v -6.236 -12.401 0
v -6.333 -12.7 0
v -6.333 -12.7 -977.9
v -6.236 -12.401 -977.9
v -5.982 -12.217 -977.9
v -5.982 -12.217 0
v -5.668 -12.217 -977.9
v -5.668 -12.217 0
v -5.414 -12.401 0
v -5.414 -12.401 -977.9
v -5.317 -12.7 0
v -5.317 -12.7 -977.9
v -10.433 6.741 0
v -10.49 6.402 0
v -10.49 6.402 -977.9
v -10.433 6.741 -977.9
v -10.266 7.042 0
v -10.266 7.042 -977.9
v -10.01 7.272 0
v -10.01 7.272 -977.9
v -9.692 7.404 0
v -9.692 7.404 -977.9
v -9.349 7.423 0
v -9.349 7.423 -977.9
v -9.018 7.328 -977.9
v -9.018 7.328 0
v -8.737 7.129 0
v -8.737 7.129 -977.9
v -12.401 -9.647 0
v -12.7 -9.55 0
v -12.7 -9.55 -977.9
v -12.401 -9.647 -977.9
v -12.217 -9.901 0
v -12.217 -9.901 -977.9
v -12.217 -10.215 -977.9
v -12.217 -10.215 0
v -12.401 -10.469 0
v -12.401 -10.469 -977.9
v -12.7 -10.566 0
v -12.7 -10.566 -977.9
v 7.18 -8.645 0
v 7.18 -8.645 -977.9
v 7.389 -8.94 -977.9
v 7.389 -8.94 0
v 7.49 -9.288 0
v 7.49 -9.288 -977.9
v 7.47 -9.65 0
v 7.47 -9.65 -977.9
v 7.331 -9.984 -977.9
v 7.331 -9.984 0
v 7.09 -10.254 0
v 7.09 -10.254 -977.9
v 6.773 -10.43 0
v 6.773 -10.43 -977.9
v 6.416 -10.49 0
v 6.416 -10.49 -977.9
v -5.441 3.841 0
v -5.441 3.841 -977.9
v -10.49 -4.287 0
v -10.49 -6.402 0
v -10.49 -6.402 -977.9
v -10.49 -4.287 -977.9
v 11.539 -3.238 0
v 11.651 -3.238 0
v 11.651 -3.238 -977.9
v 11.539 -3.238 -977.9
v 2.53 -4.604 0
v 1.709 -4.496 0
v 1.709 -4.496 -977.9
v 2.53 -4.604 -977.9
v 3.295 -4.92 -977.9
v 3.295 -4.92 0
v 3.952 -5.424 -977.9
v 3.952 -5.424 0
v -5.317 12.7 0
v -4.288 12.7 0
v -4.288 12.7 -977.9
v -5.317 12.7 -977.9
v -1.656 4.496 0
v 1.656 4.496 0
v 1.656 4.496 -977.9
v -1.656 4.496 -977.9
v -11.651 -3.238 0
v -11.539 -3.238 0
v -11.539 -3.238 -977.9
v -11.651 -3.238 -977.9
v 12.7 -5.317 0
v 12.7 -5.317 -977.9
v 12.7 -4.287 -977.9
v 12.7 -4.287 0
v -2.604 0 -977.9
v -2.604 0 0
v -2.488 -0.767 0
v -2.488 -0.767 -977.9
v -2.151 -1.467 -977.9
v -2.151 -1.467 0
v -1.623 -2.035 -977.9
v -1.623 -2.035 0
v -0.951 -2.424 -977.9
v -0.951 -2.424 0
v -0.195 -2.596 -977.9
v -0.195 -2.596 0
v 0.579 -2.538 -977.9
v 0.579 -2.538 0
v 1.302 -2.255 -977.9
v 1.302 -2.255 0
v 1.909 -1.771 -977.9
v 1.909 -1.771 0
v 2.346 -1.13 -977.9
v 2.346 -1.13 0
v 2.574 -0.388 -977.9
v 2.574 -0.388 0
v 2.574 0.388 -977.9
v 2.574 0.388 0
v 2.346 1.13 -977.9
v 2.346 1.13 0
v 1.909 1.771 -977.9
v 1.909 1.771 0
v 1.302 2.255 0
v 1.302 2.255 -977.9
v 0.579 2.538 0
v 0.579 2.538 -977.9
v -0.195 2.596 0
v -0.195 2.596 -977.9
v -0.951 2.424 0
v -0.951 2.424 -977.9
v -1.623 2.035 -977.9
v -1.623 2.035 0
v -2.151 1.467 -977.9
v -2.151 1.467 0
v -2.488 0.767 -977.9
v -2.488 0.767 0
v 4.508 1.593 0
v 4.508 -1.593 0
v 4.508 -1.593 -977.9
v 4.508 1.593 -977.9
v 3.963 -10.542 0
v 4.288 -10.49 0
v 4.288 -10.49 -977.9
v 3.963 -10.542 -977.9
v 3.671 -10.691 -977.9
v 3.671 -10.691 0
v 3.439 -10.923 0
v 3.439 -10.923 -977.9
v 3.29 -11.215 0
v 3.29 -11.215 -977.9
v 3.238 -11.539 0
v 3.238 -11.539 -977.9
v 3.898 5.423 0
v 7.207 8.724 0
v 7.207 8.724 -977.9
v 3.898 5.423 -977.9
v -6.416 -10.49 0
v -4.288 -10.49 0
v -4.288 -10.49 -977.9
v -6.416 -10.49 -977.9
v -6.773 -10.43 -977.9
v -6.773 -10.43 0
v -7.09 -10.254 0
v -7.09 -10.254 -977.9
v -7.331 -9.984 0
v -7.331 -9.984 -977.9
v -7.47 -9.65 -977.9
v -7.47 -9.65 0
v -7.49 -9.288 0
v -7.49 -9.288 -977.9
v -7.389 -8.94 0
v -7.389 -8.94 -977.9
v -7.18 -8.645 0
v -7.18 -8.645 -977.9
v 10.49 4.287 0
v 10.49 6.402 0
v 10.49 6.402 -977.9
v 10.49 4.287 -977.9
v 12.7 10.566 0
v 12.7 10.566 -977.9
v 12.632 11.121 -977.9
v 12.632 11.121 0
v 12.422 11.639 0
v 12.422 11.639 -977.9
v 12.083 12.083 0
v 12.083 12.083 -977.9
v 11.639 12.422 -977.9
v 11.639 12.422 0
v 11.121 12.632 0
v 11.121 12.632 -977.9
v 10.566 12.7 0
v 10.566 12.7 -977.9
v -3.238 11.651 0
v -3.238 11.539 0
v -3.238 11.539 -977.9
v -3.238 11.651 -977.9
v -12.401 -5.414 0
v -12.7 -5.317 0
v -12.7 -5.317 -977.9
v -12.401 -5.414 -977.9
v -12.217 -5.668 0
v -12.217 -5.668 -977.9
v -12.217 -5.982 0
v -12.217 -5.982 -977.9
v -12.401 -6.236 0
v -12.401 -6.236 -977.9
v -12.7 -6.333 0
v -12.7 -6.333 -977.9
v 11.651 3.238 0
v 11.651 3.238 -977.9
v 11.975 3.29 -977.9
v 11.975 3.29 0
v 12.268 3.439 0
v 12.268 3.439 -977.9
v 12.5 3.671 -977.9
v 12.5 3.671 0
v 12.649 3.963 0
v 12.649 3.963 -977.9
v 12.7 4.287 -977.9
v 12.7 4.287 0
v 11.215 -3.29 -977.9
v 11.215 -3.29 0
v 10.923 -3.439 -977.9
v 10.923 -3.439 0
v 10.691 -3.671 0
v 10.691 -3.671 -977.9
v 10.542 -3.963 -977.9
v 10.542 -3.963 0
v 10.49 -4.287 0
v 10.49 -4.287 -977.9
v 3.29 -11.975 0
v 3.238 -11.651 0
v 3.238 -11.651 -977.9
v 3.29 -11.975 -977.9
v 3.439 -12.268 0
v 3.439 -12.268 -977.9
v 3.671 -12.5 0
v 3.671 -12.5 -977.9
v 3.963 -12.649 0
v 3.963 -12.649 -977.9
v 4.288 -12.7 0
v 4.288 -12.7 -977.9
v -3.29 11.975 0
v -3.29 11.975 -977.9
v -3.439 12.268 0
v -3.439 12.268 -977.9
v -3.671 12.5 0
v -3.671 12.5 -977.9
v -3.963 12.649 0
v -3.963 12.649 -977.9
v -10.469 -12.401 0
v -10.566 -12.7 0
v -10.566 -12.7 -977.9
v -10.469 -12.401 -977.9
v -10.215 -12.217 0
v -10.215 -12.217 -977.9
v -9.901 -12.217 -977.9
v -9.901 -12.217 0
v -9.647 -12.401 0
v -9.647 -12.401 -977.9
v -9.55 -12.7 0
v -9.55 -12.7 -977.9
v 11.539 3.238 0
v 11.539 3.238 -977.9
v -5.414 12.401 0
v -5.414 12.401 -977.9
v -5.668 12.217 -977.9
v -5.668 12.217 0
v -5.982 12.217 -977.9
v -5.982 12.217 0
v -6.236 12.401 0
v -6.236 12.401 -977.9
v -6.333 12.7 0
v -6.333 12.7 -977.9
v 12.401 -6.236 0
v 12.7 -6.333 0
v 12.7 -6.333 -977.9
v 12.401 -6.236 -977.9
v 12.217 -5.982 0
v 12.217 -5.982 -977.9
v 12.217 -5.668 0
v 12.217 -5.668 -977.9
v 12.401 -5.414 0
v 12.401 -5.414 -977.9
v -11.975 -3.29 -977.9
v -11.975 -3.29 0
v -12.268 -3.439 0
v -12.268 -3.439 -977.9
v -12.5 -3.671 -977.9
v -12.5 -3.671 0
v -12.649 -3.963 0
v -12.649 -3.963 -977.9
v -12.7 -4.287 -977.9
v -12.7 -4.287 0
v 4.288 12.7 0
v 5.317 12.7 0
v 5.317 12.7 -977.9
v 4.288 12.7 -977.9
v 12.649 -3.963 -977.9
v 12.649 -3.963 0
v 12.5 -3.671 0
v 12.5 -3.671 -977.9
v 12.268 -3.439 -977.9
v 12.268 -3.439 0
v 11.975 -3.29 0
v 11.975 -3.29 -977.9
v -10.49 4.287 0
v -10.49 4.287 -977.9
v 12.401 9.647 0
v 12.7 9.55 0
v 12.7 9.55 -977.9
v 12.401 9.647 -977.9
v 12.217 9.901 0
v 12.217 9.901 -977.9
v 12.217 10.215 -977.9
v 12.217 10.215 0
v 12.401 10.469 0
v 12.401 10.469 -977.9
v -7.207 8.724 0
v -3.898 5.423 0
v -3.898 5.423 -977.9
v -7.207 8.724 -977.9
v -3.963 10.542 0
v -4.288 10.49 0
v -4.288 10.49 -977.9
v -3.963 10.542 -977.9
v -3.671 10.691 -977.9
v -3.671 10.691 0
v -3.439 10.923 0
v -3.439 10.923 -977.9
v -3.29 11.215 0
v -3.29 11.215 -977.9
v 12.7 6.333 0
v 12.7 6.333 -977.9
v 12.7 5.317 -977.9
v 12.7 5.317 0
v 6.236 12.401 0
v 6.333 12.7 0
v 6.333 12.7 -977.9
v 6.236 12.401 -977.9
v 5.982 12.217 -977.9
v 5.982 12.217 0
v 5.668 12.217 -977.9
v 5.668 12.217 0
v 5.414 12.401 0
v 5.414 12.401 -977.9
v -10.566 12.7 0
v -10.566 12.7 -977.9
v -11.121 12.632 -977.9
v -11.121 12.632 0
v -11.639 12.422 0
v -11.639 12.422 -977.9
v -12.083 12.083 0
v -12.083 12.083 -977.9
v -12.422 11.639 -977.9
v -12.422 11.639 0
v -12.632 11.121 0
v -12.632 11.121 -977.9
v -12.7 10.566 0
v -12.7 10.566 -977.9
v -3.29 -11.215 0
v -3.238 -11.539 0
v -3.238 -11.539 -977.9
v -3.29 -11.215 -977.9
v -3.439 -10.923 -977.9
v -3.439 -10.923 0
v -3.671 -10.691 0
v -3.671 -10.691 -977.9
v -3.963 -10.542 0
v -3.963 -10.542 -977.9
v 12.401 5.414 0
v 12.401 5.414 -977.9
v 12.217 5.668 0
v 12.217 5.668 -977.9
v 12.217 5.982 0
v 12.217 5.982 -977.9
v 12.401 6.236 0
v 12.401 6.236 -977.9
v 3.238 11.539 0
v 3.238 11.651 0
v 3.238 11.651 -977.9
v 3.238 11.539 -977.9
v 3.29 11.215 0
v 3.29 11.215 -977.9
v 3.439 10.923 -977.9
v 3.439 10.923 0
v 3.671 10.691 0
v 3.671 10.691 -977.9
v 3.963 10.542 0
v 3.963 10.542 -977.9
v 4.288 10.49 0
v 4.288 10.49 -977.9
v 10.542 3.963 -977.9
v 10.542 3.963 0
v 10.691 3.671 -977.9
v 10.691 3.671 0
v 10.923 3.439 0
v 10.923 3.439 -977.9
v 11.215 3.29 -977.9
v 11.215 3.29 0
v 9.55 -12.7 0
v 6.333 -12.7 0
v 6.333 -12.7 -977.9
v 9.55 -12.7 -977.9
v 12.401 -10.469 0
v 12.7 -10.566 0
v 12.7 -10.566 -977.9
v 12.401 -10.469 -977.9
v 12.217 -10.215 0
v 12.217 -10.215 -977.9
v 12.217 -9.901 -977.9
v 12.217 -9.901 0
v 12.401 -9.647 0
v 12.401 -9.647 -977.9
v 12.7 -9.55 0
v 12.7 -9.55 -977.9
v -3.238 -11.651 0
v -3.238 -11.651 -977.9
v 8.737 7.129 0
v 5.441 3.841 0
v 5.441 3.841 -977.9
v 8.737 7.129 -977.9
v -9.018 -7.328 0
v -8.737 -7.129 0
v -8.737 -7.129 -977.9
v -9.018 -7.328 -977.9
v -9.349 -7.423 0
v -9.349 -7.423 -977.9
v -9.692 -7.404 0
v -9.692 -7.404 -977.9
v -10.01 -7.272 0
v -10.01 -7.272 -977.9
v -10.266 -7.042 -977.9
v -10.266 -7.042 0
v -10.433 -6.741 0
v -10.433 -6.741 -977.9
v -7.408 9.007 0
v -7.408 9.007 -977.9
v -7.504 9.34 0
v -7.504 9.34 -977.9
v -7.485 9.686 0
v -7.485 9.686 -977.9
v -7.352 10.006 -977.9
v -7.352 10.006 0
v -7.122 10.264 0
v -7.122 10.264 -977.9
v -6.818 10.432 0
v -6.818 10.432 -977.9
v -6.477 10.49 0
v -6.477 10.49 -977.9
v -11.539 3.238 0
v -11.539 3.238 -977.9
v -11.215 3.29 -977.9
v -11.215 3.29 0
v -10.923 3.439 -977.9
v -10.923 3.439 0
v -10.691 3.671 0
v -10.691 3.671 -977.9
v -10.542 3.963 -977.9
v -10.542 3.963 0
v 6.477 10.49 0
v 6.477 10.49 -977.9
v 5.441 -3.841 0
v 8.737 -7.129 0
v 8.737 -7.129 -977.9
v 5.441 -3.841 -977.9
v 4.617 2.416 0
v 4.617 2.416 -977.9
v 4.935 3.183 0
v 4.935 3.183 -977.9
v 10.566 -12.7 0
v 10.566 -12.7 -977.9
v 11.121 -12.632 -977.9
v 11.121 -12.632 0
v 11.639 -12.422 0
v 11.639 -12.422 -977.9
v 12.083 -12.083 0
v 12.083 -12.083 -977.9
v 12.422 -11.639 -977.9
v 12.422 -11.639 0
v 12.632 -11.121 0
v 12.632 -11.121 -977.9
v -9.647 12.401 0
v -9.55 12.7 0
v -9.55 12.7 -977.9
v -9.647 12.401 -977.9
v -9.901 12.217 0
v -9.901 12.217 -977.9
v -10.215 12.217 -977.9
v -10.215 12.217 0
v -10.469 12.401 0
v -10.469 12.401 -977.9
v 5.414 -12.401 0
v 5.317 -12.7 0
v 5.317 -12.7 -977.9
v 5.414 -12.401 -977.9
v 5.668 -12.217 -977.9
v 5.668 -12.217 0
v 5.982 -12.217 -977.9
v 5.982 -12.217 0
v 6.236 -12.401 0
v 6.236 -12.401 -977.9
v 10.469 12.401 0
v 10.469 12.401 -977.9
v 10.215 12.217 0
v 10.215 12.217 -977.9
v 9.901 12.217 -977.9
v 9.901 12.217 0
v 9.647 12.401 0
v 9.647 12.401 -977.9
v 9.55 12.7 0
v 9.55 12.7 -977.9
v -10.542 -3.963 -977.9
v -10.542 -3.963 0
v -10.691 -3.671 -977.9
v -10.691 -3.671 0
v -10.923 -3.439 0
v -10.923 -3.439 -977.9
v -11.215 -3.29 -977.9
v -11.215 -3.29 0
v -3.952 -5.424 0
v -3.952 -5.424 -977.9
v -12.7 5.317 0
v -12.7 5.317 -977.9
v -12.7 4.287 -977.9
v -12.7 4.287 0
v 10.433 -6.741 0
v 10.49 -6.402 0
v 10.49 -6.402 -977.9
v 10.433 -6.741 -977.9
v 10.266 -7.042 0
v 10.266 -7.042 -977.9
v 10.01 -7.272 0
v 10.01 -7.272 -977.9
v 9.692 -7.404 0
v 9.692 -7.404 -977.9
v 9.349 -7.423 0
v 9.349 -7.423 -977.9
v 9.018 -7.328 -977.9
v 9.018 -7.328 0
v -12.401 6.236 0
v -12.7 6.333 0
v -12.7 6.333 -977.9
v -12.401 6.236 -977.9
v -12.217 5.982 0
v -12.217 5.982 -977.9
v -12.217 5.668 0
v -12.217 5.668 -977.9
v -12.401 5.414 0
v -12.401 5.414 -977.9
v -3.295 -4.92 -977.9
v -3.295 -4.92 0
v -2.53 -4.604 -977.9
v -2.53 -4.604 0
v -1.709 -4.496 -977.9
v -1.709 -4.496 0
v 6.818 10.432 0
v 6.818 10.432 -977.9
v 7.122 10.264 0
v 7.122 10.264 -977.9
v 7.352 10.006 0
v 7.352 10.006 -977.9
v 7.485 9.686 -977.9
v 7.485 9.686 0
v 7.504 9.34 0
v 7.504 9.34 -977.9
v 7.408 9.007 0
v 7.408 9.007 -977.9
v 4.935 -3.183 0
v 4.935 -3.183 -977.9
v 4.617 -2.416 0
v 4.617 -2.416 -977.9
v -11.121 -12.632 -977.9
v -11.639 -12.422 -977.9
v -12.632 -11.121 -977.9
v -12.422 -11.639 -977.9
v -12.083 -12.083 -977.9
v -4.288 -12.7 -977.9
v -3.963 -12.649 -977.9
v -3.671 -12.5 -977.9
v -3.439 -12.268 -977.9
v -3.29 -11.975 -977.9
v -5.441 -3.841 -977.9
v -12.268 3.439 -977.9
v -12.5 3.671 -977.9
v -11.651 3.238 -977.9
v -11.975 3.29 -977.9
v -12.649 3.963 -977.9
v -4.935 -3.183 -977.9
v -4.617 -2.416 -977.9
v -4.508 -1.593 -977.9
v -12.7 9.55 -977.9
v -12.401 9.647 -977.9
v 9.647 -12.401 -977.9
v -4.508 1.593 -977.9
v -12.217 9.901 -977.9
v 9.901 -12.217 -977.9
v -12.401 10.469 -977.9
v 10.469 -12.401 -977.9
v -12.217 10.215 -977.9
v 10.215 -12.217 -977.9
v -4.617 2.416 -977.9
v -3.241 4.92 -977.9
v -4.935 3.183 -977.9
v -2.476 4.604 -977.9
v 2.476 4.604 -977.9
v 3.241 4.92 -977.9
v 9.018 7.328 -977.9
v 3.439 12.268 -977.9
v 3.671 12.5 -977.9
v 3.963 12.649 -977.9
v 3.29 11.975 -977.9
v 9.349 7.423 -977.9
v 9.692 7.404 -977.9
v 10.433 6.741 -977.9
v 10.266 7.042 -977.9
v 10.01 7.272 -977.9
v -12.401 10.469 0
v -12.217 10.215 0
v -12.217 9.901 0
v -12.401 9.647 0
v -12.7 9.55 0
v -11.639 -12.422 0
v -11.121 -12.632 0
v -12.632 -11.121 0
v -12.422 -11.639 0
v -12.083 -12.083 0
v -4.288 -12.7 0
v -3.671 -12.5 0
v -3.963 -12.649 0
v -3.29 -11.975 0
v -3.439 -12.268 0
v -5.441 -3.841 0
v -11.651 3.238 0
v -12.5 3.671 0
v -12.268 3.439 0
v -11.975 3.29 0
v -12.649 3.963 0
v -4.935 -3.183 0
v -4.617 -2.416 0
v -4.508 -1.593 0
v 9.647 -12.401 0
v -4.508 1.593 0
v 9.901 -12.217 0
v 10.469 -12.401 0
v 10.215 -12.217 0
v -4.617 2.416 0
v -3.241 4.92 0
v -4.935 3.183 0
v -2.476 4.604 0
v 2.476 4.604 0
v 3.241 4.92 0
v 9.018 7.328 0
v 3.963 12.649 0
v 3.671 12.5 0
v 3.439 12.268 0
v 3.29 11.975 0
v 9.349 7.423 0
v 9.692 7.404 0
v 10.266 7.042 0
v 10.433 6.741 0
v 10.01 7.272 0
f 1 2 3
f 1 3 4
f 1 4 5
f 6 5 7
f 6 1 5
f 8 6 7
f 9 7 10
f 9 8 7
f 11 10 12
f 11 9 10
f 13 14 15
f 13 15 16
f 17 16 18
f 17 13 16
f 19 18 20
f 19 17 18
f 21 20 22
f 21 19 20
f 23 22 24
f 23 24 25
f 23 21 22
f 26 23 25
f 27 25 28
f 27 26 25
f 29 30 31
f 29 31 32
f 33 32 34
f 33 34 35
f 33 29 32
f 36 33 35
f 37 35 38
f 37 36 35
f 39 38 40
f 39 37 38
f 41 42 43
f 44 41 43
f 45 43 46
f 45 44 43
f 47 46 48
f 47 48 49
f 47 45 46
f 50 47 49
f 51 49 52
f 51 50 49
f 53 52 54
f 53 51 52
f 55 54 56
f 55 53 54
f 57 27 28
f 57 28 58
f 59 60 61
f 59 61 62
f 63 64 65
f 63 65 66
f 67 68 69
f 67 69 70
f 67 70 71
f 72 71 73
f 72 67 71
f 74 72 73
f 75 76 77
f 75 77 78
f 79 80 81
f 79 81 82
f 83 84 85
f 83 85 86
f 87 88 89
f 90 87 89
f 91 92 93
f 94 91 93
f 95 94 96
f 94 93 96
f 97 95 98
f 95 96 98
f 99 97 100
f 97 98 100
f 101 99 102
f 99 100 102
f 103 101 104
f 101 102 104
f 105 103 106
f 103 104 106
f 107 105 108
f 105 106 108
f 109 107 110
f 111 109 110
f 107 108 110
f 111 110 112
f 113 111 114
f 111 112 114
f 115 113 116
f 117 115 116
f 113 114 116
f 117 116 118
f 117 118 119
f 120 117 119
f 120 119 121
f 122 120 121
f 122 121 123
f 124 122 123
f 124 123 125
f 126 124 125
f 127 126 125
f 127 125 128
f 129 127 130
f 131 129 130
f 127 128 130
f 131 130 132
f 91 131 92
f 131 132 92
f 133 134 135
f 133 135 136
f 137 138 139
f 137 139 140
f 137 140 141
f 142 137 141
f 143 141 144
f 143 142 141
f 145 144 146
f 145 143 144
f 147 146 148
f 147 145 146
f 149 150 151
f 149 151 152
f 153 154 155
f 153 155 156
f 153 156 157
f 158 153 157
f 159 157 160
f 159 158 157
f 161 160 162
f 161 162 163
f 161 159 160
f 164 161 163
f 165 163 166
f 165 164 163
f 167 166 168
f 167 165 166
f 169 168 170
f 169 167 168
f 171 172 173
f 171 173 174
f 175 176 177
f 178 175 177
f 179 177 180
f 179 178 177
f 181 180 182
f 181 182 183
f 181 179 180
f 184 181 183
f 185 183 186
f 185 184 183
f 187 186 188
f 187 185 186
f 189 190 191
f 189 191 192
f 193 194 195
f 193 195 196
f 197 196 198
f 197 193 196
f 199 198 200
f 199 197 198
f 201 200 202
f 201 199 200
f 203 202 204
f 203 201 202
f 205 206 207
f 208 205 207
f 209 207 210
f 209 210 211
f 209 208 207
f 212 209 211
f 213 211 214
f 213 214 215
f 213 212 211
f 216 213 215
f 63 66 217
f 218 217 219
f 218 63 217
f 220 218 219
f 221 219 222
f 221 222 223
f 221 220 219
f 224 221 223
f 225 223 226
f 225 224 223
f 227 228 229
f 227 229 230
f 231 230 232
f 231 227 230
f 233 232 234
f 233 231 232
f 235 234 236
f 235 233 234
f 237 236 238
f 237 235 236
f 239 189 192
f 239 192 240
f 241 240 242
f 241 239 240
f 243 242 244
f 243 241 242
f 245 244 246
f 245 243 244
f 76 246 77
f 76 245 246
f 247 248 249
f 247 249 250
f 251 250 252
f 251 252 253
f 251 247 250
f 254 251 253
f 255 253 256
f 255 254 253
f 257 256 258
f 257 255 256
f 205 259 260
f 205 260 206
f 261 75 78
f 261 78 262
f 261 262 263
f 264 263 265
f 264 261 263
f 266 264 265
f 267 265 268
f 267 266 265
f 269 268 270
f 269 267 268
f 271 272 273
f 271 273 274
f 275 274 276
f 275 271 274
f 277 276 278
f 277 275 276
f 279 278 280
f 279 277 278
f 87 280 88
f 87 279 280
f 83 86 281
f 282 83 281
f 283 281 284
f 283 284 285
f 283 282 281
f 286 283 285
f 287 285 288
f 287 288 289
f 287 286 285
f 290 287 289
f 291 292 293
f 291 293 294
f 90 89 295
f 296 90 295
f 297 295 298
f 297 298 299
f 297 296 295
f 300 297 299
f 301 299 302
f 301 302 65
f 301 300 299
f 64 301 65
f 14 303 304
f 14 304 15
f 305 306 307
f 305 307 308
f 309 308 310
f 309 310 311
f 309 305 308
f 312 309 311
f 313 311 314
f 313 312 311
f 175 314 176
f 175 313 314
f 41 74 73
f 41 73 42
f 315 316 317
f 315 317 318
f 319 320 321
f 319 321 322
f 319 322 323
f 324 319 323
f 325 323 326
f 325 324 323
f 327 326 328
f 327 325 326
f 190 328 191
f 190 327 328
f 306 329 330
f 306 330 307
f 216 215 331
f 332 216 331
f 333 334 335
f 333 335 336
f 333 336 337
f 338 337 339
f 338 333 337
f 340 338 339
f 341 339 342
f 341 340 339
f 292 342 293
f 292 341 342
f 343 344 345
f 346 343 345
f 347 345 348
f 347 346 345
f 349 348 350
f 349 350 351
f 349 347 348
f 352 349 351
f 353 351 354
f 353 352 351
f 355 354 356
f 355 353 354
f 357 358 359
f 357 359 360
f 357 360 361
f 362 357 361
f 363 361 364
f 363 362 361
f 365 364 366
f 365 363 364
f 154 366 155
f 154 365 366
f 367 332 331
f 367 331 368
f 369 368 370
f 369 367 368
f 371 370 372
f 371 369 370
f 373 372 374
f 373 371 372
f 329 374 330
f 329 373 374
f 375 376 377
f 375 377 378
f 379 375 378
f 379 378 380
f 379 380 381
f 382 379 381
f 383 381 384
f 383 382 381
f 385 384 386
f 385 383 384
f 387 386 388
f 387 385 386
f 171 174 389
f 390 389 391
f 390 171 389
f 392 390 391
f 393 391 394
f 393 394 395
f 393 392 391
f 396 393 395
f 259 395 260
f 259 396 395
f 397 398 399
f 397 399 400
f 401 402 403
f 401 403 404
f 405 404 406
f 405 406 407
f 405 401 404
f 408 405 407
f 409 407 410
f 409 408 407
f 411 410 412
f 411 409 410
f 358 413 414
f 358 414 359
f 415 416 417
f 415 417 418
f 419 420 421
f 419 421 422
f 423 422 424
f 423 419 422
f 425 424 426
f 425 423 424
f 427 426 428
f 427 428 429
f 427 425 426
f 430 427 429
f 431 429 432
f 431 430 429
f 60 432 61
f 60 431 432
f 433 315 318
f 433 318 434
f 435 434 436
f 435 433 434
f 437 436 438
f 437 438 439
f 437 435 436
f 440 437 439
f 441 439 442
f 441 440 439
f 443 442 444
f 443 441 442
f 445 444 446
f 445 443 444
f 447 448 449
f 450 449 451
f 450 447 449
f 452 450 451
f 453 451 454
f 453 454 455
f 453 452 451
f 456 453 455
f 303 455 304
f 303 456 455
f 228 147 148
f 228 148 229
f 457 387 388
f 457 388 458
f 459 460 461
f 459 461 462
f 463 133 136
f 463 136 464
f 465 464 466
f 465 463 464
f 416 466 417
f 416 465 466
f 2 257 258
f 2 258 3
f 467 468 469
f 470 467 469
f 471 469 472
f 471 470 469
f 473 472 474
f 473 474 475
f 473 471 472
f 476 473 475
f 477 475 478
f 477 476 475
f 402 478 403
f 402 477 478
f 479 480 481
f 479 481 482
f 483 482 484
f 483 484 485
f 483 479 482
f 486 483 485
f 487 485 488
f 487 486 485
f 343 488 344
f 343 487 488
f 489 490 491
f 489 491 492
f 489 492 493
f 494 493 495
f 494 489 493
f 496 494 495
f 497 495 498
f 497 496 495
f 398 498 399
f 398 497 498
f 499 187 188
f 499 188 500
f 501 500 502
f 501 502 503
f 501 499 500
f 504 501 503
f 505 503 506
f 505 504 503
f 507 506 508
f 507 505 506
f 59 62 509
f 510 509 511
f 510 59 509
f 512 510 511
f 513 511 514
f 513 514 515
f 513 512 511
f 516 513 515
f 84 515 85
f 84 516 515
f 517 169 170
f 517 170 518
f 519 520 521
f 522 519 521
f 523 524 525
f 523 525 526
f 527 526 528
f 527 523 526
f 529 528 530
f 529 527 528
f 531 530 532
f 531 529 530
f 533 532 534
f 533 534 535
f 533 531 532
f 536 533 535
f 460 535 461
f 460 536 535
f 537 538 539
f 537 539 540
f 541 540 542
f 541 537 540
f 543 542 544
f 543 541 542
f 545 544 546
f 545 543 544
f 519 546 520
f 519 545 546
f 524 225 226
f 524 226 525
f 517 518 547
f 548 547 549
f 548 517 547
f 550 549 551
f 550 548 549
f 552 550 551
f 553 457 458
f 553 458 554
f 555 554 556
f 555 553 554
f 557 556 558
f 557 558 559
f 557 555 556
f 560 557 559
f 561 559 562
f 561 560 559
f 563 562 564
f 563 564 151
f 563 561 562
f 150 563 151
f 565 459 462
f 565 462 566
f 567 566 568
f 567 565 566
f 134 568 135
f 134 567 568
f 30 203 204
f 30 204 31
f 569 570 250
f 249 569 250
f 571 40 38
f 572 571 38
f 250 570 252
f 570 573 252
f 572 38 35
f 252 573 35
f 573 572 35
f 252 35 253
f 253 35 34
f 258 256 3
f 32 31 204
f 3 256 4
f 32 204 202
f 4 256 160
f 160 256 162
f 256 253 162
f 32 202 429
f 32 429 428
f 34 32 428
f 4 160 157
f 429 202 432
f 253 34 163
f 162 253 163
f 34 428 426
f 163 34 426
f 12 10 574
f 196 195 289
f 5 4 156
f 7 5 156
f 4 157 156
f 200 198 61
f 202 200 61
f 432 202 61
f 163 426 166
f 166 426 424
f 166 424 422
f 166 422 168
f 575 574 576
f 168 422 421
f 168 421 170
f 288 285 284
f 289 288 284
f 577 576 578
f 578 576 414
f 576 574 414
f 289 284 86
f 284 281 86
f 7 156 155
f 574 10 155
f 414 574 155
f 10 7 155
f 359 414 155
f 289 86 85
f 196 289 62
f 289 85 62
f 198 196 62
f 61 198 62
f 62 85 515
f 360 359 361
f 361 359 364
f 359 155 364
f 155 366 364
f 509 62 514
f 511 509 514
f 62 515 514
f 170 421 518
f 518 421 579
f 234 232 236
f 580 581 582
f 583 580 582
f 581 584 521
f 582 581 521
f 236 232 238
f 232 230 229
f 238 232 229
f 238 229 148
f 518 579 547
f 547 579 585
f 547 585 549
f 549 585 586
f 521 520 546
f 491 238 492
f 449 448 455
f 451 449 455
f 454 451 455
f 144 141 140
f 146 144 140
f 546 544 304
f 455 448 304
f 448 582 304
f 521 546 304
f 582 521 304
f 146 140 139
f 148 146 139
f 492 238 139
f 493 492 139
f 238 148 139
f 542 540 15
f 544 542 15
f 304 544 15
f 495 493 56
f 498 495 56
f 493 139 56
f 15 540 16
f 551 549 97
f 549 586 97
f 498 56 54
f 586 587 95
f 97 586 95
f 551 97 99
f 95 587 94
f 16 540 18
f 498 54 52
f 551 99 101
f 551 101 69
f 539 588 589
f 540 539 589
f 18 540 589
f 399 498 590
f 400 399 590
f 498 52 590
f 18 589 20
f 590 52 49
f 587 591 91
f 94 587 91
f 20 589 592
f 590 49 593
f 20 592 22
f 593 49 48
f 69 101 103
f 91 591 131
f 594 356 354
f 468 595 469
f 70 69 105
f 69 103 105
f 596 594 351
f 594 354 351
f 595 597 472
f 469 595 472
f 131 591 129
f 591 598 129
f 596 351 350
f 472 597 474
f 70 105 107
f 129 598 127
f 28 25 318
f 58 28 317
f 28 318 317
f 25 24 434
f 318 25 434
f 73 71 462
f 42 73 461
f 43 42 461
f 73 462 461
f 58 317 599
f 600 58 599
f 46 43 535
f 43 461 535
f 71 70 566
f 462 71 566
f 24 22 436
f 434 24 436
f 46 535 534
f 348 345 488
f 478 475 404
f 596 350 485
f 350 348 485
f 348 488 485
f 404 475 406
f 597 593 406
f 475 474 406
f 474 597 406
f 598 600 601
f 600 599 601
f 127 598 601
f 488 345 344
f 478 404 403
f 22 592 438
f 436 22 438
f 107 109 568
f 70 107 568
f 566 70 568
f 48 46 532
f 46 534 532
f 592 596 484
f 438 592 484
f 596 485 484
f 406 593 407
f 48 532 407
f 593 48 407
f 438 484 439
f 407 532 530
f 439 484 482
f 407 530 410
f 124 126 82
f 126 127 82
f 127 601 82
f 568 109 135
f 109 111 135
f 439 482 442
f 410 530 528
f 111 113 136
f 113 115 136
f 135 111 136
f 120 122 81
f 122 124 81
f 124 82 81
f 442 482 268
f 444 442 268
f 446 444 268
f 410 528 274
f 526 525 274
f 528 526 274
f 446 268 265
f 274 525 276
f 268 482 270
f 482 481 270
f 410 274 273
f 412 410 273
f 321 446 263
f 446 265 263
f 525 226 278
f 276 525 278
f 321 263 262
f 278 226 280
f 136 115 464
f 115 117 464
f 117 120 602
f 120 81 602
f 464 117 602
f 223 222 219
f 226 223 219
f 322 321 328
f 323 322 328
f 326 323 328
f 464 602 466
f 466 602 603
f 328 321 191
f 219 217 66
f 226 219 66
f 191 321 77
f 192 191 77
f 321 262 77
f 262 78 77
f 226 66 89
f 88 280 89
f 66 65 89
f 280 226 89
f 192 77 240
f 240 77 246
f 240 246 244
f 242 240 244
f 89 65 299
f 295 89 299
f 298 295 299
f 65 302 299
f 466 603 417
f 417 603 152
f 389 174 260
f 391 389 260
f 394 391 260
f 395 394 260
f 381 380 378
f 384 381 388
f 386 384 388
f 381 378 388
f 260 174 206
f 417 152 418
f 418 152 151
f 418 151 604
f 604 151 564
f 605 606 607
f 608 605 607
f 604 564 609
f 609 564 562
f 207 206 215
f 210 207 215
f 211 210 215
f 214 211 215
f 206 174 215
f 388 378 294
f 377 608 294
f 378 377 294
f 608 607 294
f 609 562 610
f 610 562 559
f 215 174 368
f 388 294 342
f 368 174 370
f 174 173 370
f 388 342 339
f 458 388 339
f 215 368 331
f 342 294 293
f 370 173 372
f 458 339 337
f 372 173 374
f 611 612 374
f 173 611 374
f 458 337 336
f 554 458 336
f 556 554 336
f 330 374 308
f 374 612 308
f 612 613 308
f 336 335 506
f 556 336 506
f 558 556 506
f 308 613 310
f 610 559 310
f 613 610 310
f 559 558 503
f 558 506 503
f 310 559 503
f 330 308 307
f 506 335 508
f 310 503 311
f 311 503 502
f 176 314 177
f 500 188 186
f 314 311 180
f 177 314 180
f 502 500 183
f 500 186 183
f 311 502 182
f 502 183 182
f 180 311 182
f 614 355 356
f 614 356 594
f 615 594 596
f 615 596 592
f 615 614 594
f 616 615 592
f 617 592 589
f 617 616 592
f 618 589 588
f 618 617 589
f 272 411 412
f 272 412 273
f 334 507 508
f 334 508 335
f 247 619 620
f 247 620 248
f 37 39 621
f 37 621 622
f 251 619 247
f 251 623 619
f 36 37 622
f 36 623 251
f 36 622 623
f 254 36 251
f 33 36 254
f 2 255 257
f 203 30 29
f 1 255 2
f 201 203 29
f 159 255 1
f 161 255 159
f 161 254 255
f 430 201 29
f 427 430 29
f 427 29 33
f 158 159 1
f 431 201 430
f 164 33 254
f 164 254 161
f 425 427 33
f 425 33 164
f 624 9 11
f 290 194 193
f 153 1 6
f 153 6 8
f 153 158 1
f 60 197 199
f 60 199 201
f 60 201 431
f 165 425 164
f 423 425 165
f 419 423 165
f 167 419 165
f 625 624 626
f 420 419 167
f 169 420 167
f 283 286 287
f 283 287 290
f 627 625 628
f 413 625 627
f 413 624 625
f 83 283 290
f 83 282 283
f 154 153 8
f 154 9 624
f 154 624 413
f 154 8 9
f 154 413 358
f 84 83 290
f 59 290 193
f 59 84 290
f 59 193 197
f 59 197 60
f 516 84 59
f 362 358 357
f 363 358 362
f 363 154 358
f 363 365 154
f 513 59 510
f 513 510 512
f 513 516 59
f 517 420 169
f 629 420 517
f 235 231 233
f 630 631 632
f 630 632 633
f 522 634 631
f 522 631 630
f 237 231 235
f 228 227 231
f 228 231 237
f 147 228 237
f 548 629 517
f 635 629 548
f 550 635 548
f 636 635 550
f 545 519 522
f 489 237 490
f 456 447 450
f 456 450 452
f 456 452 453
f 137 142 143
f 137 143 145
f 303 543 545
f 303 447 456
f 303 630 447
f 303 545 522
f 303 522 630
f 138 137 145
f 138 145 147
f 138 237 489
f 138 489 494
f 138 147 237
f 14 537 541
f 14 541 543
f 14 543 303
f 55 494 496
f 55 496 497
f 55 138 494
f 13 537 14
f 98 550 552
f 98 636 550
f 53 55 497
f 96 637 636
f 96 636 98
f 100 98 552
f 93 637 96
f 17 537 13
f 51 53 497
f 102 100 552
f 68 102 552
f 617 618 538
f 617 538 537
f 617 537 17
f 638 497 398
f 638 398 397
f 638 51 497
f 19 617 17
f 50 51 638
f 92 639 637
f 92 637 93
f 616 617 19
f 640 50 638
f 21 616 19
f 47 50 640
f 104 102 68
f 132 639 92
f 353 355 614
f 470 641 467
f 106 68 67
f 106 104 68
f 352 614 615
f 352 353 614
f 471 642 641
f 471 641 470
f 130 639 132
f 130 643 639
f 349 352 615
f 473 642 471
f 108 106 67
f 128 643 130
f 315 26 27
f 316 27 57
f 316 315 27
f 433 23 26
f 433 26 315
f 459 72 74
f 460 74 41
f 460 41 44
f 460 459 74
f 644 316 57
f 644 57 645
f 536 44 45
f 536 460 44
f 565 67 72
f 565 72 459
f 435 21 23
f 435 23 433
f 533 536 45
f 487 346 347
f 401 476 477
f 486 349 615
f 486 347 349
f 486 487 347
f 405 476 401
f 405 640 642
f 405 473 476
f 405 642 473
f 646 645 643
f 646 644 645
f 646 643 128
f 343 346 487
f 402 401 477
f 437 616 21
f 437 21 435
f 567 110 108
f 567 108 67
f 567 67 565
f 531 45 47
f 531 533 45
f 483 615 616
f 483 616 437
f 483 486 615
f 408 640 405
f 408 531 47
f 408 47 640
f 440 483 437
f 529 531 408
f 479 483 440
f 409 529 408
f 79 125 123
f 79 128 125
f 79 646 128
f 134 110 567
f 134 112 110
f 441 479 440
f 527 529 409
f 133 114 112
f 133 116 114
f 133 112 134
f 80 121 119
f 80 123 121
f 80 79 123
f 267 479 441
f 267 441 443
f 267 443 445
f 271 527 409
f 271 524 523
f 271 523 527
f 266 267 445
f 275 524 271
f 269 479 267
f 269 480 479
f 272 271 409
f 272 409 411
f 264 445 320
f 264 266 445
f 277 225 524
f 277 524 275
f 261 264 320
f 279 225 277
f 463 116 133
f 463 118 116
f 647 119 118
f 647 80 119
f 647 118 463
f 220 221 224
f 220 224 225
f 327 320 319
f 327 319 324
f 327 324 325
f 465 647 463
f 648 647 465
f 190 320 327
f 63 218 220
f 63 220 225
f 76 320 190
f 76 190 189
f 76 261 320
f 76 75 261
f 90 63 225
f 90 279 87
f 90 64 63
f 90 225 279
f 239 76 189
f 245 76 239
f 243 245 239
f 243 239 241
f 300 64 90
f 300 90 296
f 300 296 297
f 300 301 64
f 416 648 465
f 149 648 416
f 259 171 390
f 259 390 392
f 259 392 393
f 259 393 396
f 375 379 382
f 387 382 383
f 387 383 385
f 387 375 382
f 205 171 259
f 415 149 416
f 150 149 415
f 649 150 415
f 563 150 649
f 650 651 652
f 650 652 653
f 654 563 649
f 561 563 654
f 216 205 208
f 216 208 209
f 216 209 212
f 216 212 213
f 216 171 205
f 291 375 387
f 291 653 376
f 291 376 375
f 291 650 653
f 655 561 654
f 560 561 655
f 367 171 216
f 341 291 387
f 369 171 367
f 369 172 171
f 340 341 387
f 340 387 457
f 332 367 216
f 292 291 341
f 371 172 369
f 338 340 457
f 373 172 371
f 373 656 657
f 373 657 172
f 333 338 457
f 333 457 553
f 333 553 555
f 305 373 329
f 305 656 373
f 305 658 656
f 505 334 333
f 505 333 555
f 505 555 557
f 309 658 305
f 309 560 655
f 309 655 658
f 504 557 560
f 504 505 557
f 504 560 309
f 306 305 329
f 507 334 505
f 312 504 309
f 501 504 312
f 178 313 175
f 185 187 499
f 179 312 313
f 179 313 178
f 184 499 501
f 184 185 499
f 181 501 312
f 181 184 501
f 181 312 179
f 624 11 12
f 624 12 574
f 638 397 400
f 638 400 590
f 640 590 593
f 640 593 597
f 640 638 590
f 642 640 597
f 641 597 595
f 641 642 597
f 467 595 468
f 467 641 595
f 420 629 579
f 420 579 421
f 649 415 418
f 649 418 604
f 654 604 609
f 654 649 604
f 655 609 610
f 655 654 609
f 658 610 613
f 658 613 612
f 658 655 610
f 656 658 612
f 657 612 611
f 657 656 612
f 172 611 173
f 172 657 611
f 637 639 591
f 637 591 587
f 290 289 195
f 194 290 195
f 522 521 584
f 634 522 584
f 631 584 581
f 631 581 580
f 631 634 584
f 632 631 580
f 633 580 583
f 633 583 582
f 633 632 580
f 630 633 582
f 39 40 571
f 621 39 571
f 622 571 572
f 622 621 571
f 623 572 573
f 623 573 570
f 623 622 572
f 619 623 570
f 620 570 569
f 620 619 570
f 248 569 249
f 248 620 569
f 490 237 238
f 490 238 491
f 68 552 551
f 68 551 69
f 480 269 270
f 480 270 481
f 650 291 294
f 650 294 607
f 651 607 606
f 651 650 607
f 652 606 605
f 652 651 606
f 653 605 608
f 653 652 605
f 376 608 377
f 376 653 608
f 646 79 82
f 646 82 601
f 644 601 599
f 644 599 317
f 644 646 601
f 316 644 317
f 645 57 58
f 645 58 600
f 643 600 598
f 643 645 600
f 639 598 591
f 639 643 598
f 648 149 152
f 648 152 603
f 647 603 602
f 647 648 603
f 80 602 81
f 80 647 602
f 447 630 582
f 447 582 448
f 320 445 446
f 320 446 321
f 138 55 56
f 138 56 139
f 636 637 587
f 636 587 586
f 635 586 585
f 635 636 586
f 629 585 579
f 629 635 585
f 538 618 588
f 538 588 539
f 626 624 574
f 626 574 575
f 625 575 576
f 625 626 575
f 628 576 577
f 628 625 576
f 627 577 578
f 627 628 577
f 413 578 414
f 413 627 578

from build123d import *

# Parameters (mm, degrees)
SKETCH1_R           = 2.6035
BOSS_EXTRUDE1_DEPTH = 977.9


with BuildPart() as part:
    # Sketch1 → Boss-Extrude1 (new body)
    with BuildSketch(Plane.XY):
        with BuildLine():
            Line((-7.179650497, -8.645192506), (-3.952270251, -5.423690499))
            ThreePointArc((-3.952270251, -5.423690499), (-2.922936451, -4.736929036), (-1.709253557, -4.4958))
            Line((-1.709253557, -4.4958), (1.709253557, -4.4958))
            ThreePointArc((1.709253557, -4.4958), (2.922936451, -4.736929036), (3.952270251, -5.423690499))
            Line((3.952270251, -5.423690499), (7.179650497, -8.645192506))
            ThreePointArc((7.179650497, -8.645192506), (7.41473083, -9.822813117), (6.416408329, -10.4902))
            Line((6.416408329, -10.4902), (4.287512407, -10.4902))
            ThreePointArc((4.287512407, -10.4902), (3.54574862, -10.79744862), (3.2385, -11.539212407))
            Line((3.2385, -11.539212407), (3.2385, -11.650987593))
            ThreePointArc((3.2385, -11.650987593), (3.54574862, -12.39275138), (4.287512407, -12.7))
            Line((4.287512407, -12.7), (5.317126718, -12.7))
            ThreePointArc((5.317126718, -12.7), (5.825126718, -12.192), (6.333126718, -12.7))
            Line((6.333126718, -12.7), (9.550443118, -12.7))
            ThreePointArc((9.550443118, -12.7), (10.058366869, -12.192000006), (10.566443095, -12.699847501))
            ThreePointArc((10.566443095, -12.699847501), (12.082537762, -12.08250727), (12.699846982, -10.566399977))
            ThreePointArc((12.699846982, -10.566399977), (12.192000006, -10.058323491), (12.7, -9.5504))
            Line((12.7, -9.5504), (12.7, -6.3330836))
            ThreePointArc((12.7, -6.3330836), (12.192, -5.8250836), (12.7, -5.3170836))
            Line((12.7, -5.3170836), (12.7, -4.287469289))
            ThreePointArc((12.7, -4.287469289), (12.39275138, -3.545705502), (11.650987593, -3.238456882))
            Line((11.650987593, -3.238456882), (11.539212407, -3.238456882))
            ThreePointArc((11.539212407, -3.238456882), (10.79744862, -3.545705502), (10.4902, -4.287469289))
            Line((10.4902, -4.287469289), (10.4902, -6.402089023))
            ThreePointArc((10.4902, -6.402089023), (9.856505071, -7.351067942), (8.737131347, -7.129408934))
            Line((8.737131347, -7.129408934), (5.441005833, -3.840816462))
            ThreePointArc((5.441005833, -3.840816462), (4.750877967, -2.809883091), (4.5085, -1.593185507))
            Line((4.5085, -1.593185507), (4.5085, 1.593185507))
            ThreePointArc((4.5085, 1.593185507), (4.750877967, 2.809883091), (5.441005833, 3.840816462))
            Line((5.441005833, 3.840816462), (8.737131347, 7.129408934))
            ThreePointArc((8.737131347, 7.129408934), (9.856505071, 7.351067942), (10.4902, 6.402089023))
            Line((10.4902, 6.402089023), (10.4902, 4.287469289))
            ThreePointArc((10.4902, 4.287469289), (10.79744862, 3.545705502), (11.539212407, 3.238456882))
            Line((11.539212407, 3.238456882), (11.650987593, 3.238456882))
            ThreePointArc((11.650987593, 3.238456882), (12.39275138, 3.545705502), (12.7, 4.287469289))
            Line((12.7, 4.287469289), (12.7, 5.3170836))
            ThreePointArc((12.7, 5.3170836), (12.192, 5.8250836), (12.7, 6.3330836))
            Line((12.7, 6.3330836), (12.7, 9.5504))
            ThreePointArc((12.7, 9.5504), (12.192000006, 10.058323491), (12.699846982, 10.566399977))
            ThreePointArc((12.699846982, 10.566399977), (12.082537762, 12.08250727), (10.566443095, 12.699847501))
            ThreePointArc((10.566443095, 12.699847501), (10.058366869, 12.192000006), (9.550443118, 12.7))
            Line((9.550443118, 12.7), (6.333126718, 12.7))
            ThreePointArc((6.333126718, 12.7), (5.825126718, 12.192), (5.317126718, 12.7))
            Line((5.317126718, 12.7), (4.287512407, 12.7))
            ThreePointArc((4.287512407, 12.7), (3.54574862, 12.39275138), (3.2385, 11.650987593))
            Line((3.2385, 11.650987593), (3.2385, 11.539212407))
            ThreePointArc((3.2385, 11.539212407), (3.54574862, 10.79744862), (4.287512407, 10.4902))
            Line((4.287512407, 10.4902), (6.476788598, 10.4902))
            ThreePointArc((6.476788598, 10.4902), (7.432222385, 9.85140422), (7.207036008, 8.724370562))
            Line((7.207036008, 8.724370562), (3.898272566, 5.423169045))
            ThreePointArc((3.898272566, 5.423169045), (2.869120213, 4.736787962), (1.655778399, 4.4958))
            Line((1.655778399, 4.4958), (-1.655778399, 4.4958))
            ThreePointArc((-1.655778399, 4.4958), (-2.869120213, 4.736787962), (-3.898272566, 5.423169045))
            Line((-3.898272566, 5.423169045), (-7.207036008, 8.724370562))
            ThreePointArc((-7.207036008, 8.724370562), (-7.432222385, 9.85140422), (-6.476788598, 10.4902))
            Line((-6.476788598, 10.4902), (-4.287512407, 10.4902))
            ThreePointArc((-4.287512407, 10.4902), (-3.54574862, 10.79744862), (-3.2385, 11.539212407))
            Line((-3.2385, 11.539212407), (-3.2385, 11.650987593))
            ThreePointArc((-3.2385, 11.650987593), (-3.54574862, 12.39275138), (-4.287512407, 12.7))
            Line((-4.287512407, 12.7), (-5.317126718, 12.7))
            ThreePointArc((-5.317126718, 12.7), (-5.825126718, 12.192), (-6.333126718, 12.7))
            Line((-6.333126718, 12.7), (-9.550443118, 12.7))
            ThreePointArc((-9.550443118, 12.7), (-10.058366869, 12.192000006), (-10.566443095, 12.699847501))
            ThreePointArc((-10.566443095, 12.699847501), (-12.082537762, 12.08250727), (-12.699846982, 10.566399977))
            ThreePointArc((-12.699846982, 10.566399977), (-12.192000006, 10.058323491), (-12.7, 9.5504))
            Line((-12.7, 9.5504), (-12.7, 6.3330836))
            ThreePointArc((-12.7, 6.3330836), (-12.192, 5.8250836), (-12.7, 5.3170836))
            Line((-12.7, 5.3170836), (-12.7, 4.287469289))
            ThreePointArc((-12.7, 4.287469289), (-12.39275138, 3.545705502), (-11.650987593, 3.238456882))
            Line((-11.650987593, 3.238456882), (-11.539212407, 3.238456882))
            ThreePointArc((-11.539212407, 3.238456882), (-10.79744862, 3.545705502), (-10.4902, 4.287469289))
            Line((-10.4902, 4.287469289), (-10.4902, 6.402089023))
            ThreePointArc((-10.4902, 6.402089023), (-9.856505071, 7.351067942), (-8.737131347, 7.129408934))
            Line((-8.737131347, 7.129408934), (-5.441005833, 3.840816462))
            ThreePointArc((-5.441005833, 3.840816462), (-4.750877967, 2.809883091), (-4.5085, 1.593185507))
            Line((-4.5085, 1.593185507), (-4.5085, -1.593185507))
            ThreePointArc((-4.5085, -1.593185507), (-4.750877967, -2.809883091), (-5.441005833, -3.840816462))
            Line((-5.441005833, -3.840816462), (-8.737131347, -7.129408934))
            ThreePointArc((-8.737131347, -7.129408934), (-9.856505071, -7.351067942), (-10.4902, -6.402089023))
            Line((-10.4902, -6.402089023), (-10.4902, -4.287469289))
            ThreePointArc((-10.4902, -4.287469289), (-10.79744862, -3.545705502), (-11.539212407, -3.238456882))
            Line((-11.539212407, -3.238456882), (-11.650987593, -3.238456882))
            ThreePointArc((-11.650987593, -3.238456882), (-12.39275138, -3.545705502), (-12.7, -4.287469289))
            Line((-12.7, -4.287469289), (-12.7, -5.3170836))
            ThreePointArc((-12.7, -5.3170836), (-12.192, -5.8250836), (-12.7, -6.3330836))
            Line((-12.7, -6.3330836), (-12.7, -9.5504))
            ThreePointArc((-12.7, -9.5504), (-12.192000006, -10.058323491), (-12.699846982, -10.566399977))
            ThreePointArc((-12.699846982, -10.566399977), (-12.082537762, -12.08250727), (-10.566443095, -12.699847501))
            ThreePointArc((-10.566443095, -12.699847501), (-10.058366869, -12.192000006), (-9.550443118, -12.7))
            Line((-9.550443118, -12.7), (-6.333126718, -12.7))
            ThreePointArc((-6.333126718, -12.7), (-5.825126718, -12.192), (-5.317126718, -12.7))
            Line((-5.317126718, -12.7), (-4.287512407, -12.7))
            ThreePointArc((-4.287512407, -12.7), (-3.54574862, -12.39275138), (-3.2385, -11.650987593))
            Line((-3.2385, -11.650987593), (-3.2385, -11.539212407))
            ThreePointArc((-3.2385, -11.539212407), (-3.54574862, -10.79744862), (-4.287512407, -10.4902))
            Line((-4.287512407, -10.4902), (-6.416408329, -10.4902))
            ThreePointArc((-6.416408329, -10.4902), (-7.41473083, -9.822813117), (-7.179650497, -8.645192506))
        make_face()
        with Locations(Location((0, 0, 0), (0, 0, 180))):
            Circle(SKETCH1_R, mode=Mode.SUBTRACT)
    extrude(amount=-BOSS_EXTRUDE1_DEPTH)


solid = part.part
